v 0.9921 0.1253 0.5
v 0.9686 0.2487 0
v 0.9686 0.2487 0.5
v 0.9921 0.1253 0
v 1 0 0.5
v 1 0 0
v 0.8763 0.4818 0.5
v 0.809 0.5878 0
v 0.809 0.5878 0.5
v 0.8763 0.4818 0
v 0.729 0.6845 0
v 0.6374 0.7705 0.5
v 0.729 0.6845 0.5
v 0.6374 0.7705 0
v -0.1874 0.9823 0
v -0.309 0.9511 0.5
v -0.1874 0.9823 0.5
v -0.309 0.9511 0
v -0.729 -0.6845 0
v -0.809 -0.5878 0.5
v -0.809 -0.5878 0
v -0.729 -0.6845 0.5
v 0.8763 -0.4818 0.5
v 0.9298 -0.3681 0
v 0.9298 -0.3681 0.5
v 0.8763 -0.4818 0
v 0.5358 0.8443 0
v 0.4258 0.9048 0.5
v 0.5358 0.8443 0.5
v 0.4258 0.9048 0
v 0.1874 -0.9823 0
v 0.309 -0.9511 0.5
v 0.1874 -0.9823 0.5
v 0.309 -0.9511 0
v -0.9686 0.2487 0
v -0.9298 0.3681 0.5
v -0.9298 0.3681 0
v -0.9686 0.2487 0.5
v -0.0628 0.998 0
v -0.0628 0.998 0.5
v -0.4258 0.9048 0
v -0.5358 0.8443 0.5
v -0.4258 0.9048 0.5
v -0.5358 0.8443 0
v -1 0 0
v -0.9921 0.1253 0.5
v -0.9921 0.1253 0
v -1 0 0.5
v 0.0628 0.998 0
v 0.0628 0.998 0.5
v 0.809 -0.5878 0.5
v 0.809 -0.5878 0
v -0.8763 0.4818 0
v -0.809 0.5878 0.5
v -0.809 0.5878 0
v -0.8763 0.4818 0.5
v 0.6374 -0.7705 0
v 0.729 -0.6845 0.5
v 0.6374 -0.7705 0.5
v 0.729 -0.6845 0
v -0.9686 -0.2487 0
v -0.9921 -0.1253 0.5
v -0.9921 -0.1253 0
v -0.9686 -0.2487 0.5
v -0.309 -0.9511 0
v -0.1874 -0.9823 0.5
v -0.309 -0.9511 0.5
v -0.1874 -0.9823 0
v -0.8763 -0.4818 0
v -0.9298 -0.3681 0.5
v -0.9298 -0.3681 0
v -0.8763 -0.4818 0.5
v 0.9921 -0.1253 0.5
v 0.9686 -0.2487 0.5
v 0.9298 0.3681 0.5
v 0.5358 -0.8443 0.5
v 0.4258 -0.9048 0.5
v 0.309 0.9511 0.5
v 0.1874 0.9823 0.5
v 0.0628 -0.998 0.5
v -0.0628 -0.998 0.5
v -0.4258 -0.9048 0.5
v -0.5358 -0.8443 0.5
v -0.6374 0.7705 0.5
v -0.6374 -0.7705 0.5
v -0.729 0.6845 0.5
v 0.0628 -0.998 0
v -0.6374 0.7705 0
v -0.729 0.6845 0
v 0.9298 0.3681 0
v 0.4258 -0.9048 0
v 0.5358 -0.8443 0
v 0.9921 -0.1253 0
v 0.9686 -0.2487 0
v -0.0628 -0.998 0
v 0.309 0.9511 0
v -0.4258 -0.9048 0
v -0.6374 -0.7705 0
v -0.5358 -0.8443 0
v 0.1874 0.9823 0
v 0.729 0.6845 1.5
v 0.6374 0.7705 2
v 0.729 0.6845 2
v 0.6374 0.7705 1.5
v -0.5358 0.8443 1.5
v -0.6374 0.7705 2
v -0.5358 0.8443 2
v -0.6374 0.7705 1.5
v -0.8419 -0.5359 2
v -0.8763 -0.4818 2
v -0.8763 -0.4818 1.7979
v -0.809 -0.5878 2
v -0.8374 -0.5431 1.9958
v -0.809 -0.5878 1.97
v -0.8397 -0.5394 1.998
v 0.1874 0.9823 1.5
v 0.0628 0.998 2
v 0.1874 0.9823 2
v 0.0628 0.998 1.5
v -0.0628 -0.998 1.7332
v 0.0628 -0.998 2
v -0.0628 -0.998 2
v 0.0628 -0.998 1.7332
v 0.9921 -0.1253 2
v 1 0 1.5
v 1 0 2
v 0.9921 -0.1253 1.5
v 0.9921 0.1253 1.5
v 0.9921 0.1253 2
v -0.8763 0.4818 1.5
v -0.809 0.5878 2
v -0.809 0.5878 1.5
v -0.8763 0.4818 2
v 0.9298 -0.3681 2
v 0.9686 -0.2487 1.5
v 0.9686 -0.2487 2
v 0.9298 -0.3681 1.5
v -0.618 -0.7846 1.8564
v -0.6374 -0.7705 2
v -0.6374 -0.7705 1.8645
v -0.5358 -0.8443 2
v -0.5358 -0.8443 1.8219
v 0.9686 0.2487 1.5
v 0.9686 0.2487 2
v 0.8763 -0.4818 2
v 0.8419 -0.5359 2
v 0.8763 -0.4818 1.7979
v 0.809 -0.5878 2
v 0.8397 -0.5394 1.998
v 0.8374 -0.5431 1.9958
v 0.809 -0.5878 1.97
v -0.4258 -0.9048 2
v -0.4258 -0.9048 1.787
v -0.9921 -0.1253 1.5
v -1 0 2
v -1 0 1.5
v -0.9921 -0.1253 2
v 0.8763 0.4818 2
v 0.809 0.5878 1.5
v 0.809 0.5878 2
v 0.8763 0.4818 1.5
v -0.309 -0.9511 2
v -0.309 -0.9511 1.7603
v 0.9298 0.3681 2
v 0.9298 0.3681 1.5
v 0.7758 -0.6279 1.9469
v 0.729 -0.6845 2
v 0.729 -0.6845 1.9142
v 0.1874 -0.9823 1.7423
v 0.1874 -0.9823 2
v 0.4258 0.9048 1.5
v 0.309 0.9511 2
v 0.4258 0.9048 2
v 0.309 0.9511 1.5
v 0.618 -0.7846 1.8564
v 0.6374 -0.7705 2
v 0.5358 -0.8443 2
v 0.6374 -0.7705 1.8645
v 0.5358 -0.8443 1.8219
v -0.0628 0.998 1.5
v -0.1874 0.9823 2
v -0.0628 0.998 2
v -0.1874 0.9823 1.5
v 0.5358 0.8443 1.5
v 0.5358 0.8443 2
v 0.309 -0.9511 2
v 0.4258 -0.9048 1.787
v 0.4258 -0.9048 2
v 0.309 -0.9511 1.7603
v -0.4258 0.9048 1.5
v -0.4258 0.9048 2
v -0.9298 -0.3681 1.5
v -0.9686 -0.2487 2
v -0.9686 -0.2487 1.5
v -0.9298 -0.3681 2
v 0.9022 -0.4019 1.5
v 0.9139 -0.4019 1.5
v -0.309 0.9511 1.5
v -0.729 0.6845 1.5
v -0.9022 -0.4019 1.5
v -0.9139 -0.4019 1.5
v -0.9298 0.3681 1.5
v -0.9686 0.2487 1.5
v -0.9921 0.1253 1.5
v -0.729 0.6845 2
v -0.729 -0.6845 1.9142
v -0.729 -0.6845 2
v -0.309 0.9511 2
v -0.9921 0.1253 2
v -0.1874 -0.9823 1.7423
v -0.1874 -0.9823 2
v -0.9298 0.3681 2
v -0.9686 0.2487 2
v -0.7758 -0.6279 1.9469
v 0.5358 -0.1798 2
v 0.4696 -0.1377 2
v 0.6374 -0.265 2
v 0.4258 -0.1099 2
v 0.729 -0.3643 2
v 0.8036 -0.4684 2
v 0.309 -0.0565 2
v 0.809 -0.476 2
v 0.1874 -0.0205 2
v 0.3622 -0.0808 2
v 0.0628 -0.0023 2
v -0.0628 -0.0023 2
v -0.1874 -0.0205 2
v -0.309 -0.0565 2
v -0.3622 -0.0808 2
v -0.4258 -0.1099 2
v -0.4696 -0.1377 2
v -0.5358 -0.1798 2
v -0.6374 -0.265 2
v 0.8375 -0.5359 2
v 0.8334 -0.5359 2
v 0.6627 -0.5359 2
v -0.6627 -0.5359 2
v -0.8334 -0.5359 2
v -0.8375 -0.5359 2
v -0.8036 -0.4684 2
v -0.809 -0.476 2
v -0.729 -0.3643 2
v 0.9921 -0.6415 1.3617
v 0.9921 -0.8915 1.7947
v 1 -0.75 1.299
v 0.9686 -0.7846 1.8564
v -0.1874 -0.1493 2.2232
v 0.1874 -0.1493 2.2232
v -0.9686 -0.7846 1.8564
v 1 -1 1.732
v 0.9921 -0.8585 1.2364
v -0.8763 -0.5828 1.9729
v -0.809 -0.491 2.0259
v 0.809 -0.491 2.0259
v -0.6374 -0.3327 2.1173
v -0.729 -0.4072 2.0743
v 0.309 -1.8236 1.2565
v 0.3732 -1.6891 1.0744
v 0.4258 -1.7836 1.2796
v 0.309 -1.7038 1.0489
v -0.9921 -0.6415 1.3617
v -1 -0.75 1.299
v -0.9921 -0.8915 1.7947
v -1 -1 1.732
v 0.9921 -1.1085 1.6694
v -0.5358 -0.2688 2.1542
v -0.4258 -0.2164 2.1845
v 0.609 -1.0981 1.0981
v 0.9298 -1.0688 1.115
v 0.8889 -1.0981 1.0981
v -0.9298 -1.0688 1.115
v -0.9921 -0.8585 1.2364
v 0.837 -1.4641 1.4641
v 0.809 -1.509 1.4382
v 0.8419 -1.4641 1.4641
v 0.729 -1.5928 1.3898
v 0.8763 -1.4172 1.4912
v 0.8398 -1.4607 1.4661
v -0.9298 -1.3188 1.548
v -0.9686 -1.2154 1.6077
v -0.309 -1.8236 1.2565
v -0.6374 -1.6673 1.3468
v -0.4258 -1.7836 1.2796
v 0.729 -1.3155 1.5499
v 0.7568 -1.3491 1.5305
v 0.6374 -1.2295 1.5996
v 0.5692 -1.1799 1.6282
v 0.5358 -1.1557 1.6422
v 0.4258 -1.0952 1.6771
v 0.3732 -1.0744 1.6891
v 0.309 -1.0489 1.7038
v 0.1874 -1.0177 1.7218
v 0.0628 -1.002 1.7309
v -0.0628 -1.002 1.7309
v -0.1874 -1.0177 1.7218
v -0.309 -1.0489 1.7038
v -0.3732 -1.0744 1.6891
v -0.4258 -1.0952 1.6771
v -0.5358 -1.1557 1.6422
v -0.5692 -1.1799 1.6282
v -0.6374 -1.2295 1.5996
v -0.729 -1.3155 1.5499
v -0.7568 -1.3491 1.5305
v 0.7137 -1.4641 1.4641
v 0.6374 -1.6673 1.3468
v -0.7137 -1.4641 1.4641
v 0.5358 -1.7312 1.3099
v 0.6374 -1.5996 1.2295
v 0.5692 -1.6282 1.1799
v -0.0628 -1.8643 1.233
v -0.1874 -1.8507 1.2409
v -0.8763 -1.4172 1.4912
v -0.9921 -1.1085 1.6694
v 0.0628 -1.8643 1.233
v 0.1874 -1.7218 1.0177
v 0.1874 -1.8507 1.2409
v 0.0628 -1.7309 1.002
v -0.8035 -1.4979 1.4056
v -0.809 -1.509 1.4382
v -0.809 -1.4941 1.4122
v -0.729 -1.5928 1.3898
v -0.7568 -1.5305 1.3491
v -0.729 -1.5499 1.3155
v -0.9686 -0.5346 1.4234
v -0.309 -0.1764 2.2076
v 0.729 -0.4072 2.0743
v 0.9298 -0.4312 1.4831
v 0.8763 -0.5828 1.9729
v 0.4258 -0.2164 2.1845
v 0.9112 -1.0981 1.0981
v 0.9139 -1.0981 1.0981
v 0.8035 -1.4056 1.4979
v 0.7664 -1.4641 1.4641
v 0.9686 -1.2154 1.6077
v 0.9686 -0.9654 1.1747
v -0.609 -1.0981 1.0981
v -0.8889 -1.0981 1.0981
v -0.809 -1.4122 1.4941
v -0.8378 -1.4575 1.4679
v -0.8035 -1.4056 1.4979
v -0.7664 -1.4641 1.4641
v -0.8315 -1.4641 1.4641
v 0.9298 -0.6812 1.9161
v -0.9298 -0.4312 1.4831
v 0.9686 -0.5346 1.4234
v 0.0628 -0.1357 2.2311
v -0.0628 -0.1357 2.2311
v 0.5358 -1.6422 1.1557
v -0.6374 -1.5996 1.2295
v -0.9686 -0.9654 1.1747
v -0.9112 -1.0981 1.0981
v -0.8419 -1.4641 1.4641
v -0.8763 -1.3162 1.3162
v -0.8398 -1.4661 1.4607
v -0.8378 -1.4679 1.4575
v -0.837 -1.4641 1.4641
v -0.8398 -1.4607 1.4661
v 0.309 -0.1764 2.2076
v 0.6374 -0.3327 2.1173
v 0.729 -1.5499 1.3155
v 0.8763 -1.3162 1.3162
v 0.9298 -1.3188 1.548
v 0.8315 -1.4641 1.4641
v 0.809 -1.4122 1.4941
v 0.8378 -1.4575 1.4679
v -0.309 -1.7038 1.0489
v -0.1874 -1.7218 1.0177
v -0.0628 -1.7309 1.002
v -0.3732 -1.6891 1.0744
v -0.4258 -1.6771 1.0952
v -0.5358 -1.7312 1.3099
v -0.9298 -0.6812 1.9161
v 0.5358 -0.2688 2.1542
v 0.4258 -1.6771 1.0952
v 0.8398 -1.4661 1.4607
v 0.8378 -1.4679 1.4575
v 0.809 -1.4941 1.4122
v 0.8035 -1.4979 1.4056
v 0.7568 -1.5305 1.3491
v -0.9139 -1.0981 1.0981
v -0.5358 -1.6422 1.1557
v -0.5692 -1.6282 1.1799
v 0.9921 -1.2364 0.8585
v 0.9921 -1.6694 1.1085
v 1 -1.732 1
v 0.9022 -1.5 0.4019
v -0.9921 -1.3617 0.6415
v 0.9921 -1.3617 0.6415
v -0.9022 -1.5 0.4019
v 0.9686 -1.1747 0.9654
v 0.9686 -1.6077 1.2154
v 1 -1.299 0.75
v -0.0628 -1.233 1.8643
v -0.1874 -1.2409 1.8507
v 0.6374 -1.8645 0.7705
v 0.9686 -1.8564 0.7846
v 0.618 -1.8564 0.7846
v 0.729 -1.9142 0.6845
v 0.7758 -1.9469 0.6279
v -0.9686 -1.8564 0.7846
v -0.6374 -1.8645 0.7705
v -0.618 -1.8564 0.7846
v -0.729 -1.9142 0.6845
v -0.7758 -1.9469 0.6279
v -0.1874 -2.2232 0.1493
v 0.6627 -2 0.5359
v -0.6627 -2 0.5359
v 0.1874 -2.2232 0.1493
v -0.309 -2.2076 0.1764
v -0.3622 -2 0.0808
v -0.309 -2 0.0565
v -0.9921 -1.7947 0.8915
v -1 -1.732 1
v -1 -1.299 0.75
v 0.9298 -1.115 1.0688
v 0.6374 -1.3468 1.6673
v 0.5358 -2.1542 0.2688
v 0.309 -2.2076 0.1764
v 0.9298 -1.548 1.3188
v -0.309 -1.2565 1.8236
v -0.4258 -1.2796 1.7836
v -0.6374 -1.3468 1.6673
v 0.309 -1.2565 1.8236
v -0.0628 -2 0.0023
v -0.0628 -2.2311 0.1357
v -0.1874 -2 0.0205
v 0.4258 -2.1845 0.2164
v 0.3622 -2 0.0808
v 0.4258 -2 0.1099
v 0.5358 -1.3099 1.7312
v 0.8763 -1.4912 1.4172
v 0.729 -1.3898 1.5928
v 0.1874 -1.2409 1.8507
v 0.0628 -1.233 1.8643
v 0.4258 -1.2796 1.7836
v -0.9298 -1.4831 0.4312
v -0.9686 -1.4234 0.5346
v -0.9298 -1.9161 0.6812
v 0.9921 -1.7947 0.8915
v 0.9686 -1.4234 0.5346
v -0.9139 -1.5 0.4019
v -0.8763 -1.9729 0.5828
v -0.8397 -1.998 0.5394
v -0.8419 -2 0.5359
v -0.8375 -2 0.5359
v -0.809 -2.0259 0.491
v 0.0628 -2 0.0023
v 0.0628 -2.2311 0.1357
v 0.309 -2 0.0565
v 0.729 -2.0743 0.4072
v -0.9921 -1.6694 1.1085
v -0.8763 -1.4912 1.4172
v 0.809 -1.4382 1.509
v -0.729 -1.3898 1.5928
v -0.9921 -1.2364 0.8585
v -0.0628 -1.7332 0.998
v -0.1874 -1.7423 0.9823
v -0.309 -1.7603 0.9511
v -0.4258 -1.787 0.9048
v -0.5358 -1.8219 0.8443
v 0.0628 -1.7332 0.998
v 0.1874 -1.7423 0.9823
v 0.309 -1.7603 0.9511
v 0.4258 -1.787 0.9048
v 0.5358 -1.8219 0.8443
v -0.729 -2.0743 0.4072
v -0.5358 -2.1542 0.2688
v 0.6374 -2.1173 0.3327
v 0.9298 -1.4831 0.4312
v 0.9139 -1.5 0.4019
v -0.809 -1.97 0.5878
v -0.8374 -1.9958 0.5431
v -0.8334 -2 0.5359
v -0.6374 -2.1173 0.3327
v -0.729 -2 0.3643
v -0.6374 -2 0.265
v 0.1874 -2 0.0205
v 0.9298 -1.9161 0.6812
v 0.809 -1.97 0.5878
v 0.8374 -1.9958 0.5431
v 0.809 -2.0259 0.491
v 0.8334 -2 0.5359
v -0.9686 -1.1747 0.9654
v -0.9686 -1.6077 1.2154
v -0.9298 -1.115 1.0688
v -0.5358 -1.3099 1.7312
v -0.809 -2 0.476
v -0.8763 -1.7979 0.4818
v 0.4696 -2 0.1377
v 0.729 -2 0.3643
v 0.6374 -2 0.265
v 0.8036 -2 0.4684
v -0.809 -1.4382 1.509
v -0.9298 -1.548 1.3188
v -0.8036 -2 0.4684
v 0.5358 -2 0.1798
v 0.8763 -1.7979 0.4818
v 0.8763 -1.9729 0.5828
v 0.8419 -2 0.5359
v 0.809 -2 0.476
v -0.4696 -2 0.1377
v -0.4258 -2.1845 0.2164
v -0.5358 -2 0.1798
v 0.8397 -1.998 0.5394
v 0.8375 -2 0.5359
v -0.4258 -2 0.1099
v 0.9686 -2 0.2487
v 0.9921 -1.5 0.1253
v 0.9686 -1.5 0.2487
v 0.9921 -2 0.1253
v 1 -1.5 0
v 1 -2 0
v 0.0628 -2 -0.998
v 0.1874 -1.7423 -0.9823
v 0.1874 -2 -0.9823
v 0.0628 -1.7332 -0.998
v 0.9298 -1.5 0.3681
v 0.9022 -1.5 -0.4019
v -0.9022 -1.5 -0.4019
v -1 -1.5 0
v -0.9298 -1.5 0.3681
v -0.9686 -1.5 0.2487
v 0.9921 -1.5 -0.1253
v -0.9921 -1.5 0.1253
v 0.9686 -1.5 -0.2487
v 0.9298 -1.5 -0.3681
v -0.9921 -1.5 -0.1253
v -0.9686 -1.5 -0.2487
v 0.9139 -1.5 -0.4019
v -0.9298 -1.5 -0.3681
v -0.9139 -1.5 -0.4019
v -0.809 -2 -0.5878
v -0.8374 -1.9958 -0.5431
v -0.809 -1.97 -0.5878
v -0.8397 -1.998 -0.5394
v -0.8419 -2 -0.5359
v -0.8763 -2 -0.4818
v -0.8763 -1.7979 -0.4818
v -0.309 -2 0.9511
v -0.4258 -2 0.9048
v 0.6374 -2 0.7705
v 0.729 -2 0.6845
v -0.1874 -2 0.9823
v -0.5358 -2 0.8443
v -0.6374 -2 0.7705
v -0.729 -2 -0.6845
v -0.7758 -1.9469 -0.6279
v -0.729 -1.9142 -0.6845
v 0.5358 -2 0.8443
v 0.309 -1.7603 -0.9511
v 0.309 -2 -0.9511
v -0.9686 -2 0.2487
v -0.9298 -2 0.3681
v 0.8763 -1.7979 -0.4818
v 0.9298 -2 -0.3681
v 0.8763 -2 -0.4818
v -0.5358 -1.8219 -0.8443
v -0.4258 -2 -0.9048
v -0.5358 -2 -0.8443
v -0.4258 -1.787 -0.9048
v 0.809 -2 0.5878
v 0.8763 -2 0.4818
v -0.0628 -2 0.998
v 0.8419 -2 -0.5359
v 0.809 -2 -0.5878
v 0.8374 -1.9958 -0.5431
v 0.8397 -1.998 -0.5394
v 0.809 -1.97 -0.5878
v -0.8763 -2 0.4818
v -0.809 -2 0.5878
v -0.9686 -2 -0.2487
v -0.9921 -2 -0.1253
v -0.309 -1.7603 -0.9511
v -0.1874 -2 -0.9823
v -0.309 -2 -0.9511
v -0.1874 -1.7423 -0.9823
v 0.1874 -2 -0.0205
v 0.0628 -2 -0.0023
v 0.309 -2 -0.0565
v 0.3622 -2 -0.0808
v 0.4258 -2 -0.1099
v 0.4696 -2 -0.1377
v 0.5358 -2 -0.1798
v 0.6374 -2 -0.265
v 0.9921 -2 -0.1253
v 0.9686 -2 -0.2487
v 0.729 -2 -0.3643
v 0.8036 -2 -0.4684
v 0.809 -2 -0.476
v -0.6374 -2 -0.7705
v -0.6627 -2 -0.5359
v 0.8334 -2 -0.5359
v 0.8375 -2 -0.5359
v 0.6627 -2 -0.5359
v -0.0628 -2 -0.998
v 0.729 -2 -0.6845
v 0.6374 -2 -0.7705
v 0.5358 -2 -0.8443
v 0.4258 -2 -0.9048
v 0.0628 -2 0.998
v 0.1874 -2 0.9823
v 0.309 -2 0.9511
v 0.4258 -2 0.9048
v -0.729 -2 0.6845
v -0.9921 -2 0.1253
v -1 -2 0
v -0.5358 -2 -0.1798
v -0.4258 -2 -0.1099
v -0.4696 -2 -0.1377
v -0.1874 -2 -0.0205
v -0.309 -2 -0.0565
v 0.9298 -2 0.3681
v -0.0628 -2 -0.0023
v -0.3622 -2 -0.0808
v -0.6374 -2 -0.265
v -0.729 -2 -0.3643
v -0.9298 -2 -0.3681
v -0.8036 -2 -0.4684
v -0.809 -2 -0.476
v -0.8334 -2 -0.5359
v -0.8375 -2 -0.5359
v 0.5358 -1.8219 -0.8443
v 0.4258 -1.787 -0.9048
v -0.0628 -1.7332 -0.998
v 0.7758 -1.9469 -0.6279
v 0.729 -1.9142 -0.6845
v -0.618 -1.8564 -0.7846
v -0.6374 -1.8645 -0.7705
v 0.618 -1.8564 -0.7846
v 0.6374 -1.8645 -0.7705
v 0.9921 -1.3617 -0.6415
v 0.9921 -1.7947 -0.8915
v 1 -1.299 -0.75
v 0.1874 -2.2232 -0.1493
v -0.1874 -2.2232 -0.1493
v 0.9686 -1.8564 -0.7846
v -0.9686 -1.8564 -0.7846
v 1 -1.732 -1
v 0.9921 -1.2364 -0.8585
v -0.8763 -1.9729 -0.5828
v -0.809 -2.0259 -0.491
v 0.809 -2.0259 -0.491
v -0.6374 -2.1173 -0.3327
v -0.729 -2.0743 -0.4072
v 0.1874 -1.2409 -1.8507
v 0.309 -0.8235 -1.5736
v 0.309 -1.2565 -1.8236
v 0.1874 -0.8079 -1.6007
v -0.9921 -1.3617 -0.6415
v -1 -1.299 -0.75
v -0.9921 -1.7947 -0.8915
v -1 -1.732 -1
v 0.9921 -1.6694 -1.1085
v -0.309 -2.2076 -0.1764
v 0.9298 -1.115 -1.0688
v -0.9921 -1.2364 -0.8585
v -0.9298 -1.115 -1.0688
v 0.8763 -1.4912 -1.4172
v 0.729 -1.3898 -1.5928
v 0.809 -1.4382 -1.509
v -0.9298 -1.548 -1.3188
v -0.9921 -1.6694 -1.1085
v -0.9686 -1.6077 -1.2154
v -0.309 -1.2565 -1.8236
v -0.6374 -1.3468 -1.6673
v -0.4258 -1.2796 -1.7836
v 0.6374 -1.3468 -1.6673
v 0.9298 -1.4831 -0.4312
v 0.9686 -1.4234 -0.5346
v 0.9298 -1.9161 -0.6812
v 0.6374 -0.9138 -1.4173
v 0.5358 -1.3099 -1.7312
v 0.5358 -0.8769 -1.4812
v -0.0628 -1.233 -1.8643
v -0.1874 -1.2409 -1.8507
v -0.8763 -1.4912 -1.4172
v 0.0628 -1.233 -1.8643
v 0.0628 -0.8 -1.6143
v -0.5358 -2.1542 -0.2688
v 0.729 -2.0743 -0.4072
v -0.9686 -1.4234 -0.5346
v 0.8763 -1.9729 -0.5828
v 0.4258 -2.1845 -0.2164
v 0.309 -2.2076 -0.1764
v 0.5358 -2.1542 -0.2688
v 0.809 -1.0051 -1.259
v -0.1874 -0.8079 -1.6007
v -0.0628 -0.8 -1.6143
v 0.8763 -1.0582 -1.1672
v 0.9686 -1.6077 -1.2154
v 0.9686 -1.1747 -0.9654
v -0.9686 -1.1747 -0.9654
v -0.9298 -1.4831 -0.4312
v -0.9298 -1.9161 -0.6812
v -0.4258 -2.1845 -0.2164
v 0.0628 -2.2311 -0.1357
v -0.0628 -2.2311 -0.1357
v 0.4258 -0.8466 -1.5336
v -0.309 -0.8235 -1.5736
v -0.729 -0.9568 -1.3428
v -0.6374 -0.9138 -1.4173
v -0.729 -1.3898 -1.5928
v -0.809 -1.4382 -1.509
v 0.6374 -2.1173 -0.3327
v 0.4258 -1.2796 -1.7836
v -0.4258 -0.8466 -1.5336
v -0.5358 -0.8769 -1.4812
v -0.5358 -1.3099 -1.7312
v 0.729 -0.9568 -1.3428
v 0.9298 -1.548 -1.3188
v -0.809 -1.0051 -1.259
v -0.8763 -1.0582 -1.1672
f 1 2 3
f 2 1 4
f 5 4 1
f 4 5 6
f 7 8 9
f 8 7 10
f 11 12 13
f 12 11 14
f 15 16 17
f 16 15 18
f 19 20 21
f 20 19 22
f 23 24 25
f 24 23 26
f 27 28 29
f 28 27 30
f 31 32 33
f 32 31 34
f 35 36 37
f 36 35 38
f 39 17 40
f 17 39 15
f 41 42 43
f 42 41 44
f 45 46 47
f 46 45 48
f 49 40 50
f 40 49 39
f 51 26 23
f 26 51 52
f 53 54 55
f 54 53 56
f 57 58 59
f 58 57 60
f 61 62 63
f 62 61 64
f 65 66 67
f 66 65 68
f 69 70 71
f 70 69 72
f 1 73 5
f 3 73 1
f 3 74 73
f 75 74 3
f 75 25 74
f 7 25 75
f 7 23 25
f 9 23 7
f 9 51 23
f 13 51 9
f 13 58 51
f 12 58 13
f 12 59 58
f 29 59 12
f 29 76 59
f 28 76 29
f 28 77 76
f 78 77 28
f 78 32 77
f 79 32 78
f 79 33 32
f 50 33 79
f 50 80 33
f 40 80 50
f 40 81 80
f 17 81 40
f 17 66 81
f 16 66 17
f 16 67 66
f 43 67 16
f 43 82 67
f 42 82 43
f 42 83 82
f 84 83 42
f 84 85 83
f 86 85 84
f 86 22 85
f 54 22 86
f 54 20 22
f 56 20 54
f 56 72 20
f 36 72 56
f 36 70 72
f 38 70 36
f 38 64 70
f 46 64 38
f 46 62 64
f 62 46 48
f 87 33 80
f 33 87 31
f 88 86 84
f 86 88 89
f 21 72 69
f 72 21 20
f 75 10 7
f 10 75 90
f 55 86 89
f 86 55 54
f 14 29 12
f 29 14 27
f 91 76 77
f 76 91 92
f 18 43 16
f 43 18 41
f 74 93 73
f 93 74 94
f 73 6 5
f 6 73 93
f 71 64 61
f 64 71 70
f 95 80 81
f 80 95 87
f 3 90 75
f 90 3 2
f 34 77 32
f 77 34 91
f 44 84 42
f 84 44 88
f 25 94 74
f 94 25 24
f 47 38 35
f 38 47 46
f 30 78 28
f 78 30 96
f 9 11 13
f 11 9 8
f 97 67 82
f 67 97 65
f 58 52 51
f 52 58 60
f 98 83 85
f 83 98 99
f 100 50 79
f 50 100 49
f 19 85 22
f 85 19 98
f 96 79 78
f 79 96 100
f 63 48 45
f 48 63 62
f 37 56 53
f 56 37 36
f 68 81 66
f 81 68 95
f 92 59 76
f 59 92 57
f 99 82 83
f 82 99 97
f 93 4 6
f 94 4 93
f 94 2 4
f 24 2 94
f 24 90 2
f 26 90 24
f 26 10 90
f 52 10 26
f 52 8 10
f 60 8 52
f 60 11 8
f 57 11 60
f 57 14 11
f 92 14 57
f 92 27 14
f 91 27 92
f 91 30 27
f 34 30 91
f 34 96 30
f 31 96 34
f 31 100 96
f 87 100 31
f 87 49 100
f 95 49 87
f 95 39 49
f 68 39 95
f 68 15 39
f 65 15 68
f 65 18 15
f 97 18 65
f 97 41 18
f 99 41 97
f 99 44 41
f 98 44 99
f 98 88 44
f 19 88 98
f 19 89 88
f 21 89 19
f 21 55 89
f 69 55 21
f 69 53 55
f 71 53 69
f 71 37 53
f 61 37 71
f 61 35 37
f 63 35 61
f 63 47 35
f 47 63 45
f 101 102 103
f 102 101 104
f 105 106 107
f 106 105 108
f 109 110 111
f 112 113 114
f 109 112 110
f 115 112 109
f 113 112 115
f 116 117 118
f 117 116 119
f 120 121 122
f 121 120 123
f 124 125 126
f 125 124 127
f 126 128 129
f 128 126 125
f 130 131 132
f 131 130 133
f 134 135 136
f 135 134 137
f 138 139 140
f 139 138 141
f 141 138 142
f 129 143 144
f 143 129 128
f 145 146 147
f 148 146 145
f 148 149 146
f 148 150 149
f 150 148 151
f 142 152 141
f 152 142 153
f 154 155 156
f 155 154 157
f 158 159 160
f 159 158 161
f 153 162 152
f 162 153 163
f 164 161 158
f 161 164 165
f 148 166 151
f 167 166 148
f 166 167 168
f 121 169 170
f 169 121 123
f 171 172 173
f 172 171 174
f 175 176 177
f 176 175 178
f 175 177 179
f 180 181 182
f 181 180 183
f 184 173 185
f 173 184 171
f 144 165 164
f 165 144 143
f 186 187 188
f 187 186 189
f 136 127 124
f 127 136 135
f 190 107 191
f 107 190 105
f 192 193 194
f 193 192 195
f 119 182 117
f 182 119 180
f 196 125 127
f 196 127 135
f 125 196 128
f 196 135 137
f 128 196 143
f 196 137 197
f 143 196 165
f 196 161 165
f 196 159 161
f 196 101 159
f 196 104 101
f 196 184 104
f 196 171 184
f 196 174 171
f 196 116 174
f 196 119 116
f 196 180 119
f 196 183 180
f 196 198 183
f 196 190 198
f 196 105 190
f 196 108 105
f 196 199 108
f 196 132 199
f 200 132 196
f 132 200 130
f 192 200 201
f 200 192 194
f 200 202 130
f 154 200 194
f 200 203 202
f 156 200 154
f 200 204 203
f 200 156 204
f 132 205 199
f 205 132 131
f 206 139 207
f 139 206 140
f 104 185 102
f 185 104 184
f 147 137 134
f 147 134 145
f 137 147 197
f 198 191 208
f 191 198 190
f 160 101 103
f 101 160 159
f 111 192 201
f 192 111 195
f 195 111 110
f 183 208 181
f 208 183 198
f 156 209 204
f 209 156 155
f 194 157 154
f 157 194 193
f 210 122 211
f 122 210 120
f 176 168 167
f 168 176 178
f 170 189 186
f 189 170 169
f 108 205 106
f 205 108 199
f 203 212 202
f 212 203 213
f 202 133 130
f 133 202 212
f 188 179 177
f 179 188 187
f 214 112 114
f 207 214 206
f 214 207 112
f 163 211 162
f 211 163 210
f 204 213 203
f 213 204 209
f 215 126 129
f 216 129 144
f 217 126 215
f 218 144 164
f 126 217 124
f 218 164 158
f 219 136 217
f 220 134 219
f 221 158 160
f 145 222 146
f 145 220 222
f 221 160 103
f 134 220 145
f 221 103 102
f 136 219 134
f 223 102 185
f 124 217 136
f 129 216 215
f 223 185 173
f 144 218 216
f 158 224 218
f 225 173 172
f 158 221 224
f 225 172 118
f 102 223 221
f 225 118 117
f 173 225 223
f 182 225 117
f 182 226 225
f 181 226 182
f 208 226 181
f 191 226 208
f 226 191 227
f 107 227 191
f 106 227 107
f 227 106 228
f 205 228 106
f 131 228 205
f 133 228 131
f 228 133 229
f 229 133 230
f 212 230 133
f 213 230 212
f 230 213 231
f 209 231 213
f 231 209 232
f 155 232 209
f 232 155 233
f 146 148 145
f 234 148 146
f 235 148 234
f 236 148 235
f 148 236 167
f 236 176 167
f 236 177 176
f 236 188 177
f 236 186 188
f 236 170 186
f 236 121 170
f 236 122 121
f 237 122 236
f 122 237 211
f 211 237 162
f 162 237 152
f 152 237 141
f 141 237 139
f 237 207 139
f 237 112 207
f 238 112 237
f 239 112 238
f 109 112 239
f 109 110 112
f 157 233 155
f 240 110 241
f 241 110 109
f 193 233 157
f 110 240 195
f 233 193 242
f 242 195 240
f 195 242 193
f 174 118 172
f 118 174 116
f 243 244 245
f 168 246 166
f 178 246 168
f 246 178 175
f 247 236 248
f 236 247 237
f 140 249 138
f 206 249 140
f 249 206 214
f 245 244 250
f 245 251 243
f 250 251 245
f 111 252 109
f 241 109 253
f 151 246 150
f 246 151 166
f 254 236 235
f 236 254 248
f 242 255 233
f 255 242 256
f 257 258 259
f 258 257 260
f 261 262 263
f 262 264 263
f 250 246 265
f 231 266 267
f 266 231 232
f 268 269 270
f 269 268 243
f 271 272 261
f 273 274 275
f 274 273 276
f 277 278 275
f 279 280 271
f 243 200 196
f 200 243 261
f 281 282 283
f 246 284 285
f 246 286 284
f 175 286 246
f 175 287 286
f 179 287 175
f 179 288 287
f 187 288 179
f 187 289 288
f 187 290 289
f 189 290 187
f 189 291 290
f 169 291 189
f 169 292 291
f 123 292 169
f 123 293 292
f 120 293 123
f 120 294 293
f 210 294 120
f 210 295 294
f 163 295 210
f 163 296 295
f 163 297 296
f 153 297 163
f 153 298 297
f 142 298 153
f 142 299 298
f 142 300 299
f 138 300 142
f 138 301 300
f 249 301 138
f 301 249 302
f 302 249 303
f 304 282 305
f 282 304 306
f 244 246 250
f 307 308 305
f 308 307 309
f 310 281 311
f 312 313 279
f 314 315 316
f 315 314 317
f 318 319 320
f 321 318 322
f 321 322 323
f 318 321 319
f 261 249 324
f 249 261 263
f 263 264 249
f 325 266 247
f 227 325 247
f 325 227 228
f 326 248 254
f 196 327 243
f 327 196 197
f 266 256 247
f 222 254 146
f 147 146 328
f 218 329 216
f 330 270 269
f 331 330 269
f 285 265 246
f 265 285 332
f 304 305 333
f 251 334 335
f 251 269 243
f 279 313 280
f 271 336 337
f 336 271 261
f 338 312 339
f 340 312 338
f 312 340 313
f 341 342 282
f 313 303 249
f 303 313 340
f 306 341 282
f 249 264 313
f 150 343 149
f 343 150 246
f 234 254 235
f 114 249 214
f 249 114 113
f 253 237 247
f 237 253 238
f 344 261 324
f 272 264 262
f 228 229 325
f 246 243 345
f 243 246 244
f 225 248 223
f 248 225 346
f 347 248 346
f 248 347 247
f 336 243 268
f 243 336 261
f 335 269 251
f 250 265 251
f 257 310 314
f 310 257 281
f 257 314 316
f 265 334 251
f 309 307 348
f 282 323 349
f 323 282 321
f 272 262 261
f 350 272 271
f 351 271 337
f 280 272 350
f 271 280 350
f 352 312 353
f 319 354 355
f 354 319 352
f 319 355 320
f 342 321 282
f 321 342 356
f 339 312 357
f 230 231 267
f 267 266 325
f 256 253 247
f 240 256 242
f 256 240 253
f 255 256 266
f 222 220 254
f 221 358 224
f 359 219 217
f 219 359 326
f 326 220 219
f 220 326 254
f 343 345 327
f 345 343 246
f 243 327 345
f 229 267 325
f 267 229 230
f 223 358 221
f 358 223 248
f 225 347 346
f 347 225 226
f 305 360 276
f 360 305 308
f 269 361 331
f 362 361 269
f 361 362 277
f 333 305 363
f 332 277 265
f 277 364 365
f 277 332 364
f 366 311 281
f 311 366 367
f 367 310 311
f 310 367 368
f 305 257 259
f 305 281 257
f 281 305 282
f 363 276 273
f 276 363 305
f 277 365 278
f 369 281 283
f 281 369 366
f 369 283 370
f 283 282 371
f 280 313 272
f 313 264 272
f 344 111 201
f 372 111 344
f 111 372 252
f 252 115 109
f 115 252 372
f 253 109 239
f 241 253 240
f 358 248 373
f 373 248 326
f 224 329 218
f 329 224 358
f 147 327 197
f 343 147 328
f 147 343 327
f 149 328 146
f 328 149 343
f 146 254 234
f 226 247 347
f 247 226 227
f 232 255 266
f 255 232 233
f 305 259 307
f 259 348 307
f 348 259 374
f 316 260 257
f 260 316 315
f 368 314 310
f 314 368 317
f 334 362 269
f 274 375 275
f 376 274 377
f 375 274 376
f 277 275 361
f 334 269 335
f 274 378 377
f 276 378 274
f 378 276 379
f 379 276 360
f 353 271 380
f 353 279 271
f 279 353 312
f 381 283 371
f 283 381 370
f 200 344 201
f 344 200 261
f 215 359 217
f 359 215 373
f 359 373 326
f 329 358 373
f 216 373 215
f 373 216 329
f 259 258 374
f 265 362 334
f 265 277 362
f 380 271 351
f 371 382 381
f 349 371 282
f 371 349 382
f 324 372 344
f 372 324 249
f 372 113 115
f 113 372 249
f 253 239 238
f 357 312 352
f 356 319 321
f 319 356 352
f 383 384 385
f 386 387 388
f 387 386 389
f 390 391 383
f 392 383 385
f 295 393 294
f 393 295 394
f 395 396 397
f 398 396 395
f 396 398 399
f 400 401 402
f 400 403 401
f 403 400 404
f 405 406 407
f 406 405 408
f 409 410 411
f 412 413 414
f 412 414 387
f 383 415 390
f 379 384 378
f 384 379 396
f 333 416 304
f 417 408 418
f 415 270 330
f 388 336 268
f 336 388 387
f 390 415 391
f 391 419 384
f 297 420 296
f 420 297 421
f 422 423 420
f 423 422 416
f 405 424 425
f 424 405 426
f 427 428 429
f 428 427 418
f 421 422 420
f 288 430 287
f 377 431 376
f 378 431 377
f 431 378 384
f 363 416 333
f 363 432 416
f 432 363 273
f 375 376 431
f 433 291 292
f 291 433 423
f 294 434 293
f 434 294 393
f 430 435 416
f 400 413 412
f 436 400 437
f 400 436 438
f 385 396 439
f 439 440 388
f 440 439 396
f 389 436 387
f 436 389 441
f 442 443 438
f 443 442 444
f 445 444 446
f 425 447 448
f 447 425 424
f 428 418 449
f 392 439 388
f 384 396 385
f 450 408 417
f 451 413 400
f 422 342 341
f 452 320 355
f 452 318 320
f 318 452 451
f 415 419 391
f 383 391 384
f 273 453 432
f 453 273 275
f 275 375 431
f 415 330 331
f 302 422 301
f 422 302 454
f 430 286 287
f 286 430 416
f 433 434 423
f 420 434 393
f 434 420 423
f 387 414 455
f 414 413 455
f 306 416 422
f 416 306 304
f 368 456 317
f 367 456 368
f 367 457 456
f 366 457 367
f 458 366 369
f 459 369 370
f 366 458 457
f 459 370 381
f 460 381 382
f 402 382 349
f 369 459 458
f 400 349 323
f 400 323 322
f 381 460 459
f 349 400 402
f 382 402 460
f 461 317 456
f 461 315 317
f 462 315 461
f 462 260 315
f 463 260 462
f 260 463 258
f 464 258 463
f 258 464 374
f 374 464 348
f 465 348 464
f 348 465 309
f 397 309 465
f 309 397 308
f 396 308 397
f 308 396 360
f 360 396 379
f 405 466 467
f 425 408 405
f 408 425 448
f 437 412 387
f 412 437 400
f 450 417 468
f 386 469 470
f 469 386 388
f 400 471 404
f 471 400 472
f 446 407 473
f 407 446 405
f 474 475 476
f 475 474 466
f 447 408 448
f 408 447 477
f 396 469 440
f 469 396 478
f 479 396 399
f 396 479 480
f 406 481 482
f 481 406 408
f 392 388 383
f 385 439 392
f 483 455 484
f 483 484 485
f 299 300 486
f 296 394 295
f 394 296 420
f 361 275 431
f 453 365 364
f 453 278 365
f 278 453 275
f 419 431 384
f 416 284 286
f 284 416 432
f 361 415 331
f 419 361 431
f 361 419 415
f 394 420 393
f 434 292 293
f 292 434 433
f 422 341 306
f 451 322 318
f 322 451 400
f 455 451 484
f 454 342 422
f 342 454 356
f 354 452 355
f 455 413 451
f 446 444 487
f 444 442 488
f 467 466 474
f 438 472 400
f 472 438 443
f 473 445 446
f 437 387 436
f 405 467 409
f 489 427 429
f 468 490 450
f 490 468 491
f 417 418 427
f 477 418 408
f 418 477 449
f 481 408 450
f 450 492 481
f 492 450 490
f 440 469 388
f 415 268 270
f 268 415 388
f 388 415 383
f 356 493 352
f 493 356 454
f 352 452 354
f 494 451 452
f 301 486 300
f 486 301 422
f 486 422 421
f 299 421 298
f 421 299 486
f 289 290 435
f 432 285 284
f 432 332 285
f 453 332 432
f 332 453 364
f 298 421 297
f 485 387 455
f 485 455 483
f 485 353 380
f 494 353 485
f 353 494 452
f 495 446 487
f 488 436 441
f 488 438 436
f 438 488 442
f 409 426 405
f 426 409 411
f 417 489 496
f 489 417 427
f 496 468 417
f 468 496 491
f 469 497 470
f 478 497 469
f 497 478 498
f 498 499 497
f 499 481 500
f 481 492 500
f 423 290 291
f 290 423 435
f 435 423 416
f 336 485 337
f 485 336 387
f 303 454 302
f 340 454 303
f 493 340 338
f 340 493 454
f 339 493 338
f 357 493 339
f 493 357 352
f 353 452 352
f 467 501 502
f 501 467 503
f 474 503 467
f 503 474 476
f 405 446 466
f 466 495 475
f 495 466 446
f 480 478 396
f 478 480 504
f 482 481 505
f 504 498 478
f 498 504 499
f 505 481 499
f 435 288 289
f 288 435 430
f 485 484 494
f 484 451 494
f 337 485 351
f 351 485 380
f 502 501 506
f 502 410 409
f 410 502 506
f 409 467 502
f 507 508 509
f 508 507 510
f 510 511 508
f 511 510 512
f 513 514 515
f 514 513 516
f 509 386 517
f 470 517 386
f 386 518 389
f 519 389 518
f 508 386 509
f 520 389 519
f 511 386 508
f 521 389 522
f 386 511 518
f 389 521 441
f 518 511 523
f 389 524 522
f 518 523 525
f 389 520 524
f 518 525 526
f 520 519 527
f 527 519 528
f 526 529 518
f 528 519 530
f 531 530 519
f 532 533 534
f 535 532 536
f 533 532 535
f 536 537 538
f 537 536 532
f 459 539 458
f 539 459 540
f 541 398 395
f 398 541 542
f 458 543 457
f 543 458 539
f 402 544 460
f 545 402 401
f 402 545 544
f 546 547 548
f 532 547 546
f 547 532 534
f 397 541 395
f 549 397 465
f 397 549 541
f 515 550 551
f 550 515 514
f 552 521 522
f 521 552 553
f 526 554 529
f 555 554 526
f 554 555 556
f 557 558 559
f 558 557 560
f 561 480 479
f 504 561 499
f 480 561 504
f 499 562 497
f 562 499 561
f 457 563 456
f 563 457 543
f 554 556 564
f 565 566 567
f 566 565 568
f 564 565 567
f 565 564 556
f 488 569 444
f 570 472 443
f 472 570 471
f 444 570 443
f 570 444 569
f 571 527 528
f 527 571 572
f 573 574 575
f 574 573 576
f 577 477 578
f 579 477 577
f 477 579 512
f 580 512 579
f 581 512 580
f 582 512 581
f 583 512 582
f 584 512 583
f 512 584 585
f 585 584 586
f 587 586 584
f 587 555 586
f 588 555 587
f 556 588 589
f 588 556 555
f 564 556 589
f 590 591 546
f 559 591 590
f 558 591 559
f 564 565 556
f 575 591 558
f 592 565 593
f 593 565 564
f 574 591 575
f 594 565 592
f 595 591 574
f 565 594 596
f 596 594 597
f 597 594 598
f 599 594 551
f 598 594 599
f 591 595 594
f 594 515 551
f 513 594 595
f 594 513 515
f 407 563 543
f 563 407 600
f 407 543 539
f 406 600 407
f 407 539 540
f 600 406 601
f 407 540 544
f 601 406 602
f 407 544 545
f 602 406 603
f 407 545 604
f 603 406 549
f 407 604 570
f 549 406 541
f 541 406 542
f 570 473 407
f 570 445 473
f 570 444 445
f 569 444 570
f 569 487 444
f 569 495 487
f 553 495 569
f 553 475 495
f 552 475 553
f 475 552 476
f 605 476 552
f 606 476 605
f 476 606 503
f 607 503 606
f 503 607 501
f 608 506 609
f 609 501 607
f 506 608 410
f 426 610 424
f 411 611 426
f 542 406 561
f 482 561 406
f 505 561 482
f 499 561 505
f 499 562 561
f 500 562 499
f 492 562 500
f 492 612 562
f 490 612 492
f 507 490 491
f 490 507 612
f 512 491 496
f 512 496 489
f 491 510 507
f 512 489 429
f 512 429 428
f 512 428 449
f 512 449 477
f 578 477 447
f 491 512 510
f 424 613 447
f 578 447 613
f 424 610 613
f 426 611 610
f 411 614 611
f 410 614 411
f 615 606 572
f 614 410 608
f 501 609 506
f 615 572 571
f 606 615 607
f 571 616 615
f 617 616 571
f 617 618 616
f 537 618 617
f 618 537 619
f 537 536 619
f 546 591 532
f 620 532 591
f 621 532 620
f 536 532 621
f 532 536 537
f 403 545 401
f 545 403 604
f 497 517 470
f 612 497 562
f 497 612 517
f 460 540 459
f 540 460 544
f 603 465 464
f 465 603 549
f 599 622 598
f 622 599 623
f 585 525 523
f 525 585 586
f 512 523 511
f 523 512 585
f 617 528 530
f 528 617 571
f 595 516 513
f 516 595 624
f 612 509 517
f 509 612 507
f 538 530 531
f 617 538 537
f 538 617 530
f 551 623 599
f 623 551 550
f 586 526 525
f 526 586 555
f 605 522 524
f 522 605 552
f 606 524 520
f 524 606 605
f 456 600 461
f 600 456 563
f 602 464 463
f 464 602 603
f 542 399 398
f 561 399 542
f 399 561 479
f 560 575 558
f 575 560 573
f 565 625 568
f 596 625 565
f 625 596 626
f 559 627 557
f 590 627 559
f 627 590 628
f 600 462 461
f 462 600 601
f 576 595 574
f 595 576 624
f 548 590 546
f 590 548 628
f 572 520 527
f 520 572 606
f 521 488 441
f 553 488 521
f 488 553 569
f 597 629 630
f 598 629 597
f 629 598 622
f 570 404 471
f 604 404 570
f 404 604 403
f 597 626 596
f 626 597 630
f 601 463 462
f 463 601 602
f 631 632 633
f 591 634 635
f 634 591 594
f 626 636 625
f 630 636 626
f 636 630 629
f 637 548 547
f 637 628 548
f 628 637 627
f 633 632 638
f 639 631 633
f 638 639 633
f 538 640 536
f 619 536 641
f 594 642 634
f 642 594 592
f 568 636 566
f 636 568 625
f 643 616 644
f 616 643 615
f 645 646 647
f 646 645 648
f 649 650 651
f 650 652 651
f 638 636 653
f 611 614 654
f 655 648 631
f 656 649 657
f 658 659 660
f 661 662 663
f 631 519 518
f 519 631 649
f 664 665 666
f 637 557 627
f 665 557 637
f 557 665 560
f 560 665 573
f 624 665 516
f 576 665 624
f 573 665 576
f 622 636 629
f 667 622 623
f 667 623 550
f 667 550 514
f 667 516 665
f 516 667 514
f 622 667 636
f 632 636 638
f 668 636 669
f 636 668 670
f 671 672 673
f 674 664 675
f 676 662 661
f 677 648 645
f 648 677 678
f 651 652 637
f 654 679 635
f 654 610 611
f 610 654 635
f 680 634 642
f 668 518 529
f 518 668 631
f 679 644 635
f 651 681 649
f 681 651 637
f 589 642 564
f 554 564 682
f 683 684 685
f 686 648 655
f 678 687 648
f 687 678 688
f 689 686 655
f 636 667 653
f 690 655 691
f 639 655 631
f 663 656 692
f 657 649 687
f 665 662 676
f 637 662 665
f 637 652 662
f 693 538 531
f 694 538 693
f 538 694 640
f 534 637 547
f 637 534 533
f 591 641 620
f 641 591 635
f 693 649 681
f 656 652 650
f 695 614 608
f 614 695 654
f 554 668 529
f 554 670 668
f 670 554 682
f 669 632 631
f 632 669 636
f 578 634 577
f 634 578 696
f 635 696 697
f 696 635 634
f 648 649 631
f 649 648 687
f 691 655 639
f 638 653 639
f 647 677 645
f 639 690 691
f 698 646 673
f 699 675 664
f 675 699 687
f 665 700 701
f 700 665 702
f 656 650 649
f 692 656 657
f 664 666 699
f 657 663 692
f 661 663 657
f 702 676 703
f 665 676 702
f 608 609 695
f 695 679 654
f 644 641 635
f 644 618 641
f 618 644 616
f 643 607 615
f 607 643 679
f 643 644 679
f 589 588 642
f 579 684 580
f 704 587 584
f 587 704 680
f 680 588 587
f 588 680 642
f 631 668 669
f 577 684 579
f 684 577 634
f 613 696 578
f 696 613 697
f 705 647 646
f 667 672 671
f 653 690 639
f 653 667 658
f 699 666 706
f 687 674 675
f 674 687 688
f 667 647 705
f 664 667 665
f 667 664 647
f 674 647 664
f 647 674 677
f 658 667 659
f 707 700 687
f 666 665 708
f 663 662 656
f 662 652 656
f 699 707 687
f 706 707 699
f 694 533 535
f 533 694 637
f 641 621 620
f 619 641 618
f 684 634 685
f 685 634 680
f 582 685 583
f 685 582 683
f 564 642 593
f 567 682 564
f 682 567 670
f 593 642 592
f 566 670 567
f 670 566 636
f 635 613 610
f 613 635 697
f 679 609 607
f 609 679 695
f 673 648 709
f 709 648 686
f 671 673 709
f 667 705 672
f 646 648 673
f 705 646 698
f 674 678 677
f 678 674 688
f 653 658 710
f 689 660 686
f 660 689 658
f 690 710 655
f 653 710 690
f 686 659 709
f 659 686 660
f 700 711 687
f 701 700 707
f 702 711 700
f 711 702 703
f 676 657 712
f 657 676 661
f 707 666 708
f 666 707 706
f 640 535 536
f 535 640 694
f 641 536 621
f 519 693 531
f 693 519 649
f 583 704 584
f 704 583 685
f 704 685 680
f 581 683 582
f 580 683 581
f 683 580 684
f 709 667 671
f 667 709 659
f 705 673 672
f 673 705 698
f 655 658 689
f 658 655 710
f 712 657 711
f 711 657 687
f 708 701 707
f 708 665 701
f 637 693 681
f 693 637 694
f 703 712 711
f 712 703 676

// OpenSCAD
// Generated by SolidPython 1.1.1 on 2021-11-15 13:37:58
$fn = 50;


union() {
	cylinder(h = 0.5000000000, r = 1);
	rotate(a = [0, 0, 0]) {
		translate(v = [0, 0, 1.5000000000]) {
			cylinder(h = 0.5000000000, r = 1);
		}
	}
	rotate(a = [30, 0, 0]) {
		translate(v = [0, 0, 1.5000000000]) {
			cylinder(h = 0.5000000000, r = 1);
		}
	}
	rotate(a = [60, 0, 0]) {
		translate(v = [0, 0, 1.5000000000]) {
			cylinder(h = 0.5000000000, r = 1);
		}
	}
	rotate(a = [90, 0, 0]) {
		translate(v = [0, 0, 1.5000000000]) {
			cylinder(h = 0.5000000000, r = 1);
		}
	}
	rotate(a = [120, 0, 0]) {
		translate(v = [0, 0, 1.5000000000]) {
			cylinder(h = 0.5000000000, r = 1);
		}
	}
}
/***********************************************
*********      SolidPython code:      **********
************************************************
 
# SolidPython example code 
# Brygg Ullmer, Clemson University
# Written 2021-10-28

from solid import *        # load in SolidPython/SCAD support code

c1 = cylinder(r=1, h=.5)
outGeom = c1

c2 = translate([0,0,1.5])(c1)

numF = 5
rot  = 0; rotIncr = 30

for i in range(numF):
  c3 = rotate([rot,0,0])(c2)
  outGeom += c3; rot += rotIncr

radialSegments = 50; hdr = '$fn = %s;' % radialSegments # create a header for the export
scad_render_to_file(outGeom, 'exTg01.scad', file_header=hdr) # write the .scad file

### end ###

 
 
************************************************/
